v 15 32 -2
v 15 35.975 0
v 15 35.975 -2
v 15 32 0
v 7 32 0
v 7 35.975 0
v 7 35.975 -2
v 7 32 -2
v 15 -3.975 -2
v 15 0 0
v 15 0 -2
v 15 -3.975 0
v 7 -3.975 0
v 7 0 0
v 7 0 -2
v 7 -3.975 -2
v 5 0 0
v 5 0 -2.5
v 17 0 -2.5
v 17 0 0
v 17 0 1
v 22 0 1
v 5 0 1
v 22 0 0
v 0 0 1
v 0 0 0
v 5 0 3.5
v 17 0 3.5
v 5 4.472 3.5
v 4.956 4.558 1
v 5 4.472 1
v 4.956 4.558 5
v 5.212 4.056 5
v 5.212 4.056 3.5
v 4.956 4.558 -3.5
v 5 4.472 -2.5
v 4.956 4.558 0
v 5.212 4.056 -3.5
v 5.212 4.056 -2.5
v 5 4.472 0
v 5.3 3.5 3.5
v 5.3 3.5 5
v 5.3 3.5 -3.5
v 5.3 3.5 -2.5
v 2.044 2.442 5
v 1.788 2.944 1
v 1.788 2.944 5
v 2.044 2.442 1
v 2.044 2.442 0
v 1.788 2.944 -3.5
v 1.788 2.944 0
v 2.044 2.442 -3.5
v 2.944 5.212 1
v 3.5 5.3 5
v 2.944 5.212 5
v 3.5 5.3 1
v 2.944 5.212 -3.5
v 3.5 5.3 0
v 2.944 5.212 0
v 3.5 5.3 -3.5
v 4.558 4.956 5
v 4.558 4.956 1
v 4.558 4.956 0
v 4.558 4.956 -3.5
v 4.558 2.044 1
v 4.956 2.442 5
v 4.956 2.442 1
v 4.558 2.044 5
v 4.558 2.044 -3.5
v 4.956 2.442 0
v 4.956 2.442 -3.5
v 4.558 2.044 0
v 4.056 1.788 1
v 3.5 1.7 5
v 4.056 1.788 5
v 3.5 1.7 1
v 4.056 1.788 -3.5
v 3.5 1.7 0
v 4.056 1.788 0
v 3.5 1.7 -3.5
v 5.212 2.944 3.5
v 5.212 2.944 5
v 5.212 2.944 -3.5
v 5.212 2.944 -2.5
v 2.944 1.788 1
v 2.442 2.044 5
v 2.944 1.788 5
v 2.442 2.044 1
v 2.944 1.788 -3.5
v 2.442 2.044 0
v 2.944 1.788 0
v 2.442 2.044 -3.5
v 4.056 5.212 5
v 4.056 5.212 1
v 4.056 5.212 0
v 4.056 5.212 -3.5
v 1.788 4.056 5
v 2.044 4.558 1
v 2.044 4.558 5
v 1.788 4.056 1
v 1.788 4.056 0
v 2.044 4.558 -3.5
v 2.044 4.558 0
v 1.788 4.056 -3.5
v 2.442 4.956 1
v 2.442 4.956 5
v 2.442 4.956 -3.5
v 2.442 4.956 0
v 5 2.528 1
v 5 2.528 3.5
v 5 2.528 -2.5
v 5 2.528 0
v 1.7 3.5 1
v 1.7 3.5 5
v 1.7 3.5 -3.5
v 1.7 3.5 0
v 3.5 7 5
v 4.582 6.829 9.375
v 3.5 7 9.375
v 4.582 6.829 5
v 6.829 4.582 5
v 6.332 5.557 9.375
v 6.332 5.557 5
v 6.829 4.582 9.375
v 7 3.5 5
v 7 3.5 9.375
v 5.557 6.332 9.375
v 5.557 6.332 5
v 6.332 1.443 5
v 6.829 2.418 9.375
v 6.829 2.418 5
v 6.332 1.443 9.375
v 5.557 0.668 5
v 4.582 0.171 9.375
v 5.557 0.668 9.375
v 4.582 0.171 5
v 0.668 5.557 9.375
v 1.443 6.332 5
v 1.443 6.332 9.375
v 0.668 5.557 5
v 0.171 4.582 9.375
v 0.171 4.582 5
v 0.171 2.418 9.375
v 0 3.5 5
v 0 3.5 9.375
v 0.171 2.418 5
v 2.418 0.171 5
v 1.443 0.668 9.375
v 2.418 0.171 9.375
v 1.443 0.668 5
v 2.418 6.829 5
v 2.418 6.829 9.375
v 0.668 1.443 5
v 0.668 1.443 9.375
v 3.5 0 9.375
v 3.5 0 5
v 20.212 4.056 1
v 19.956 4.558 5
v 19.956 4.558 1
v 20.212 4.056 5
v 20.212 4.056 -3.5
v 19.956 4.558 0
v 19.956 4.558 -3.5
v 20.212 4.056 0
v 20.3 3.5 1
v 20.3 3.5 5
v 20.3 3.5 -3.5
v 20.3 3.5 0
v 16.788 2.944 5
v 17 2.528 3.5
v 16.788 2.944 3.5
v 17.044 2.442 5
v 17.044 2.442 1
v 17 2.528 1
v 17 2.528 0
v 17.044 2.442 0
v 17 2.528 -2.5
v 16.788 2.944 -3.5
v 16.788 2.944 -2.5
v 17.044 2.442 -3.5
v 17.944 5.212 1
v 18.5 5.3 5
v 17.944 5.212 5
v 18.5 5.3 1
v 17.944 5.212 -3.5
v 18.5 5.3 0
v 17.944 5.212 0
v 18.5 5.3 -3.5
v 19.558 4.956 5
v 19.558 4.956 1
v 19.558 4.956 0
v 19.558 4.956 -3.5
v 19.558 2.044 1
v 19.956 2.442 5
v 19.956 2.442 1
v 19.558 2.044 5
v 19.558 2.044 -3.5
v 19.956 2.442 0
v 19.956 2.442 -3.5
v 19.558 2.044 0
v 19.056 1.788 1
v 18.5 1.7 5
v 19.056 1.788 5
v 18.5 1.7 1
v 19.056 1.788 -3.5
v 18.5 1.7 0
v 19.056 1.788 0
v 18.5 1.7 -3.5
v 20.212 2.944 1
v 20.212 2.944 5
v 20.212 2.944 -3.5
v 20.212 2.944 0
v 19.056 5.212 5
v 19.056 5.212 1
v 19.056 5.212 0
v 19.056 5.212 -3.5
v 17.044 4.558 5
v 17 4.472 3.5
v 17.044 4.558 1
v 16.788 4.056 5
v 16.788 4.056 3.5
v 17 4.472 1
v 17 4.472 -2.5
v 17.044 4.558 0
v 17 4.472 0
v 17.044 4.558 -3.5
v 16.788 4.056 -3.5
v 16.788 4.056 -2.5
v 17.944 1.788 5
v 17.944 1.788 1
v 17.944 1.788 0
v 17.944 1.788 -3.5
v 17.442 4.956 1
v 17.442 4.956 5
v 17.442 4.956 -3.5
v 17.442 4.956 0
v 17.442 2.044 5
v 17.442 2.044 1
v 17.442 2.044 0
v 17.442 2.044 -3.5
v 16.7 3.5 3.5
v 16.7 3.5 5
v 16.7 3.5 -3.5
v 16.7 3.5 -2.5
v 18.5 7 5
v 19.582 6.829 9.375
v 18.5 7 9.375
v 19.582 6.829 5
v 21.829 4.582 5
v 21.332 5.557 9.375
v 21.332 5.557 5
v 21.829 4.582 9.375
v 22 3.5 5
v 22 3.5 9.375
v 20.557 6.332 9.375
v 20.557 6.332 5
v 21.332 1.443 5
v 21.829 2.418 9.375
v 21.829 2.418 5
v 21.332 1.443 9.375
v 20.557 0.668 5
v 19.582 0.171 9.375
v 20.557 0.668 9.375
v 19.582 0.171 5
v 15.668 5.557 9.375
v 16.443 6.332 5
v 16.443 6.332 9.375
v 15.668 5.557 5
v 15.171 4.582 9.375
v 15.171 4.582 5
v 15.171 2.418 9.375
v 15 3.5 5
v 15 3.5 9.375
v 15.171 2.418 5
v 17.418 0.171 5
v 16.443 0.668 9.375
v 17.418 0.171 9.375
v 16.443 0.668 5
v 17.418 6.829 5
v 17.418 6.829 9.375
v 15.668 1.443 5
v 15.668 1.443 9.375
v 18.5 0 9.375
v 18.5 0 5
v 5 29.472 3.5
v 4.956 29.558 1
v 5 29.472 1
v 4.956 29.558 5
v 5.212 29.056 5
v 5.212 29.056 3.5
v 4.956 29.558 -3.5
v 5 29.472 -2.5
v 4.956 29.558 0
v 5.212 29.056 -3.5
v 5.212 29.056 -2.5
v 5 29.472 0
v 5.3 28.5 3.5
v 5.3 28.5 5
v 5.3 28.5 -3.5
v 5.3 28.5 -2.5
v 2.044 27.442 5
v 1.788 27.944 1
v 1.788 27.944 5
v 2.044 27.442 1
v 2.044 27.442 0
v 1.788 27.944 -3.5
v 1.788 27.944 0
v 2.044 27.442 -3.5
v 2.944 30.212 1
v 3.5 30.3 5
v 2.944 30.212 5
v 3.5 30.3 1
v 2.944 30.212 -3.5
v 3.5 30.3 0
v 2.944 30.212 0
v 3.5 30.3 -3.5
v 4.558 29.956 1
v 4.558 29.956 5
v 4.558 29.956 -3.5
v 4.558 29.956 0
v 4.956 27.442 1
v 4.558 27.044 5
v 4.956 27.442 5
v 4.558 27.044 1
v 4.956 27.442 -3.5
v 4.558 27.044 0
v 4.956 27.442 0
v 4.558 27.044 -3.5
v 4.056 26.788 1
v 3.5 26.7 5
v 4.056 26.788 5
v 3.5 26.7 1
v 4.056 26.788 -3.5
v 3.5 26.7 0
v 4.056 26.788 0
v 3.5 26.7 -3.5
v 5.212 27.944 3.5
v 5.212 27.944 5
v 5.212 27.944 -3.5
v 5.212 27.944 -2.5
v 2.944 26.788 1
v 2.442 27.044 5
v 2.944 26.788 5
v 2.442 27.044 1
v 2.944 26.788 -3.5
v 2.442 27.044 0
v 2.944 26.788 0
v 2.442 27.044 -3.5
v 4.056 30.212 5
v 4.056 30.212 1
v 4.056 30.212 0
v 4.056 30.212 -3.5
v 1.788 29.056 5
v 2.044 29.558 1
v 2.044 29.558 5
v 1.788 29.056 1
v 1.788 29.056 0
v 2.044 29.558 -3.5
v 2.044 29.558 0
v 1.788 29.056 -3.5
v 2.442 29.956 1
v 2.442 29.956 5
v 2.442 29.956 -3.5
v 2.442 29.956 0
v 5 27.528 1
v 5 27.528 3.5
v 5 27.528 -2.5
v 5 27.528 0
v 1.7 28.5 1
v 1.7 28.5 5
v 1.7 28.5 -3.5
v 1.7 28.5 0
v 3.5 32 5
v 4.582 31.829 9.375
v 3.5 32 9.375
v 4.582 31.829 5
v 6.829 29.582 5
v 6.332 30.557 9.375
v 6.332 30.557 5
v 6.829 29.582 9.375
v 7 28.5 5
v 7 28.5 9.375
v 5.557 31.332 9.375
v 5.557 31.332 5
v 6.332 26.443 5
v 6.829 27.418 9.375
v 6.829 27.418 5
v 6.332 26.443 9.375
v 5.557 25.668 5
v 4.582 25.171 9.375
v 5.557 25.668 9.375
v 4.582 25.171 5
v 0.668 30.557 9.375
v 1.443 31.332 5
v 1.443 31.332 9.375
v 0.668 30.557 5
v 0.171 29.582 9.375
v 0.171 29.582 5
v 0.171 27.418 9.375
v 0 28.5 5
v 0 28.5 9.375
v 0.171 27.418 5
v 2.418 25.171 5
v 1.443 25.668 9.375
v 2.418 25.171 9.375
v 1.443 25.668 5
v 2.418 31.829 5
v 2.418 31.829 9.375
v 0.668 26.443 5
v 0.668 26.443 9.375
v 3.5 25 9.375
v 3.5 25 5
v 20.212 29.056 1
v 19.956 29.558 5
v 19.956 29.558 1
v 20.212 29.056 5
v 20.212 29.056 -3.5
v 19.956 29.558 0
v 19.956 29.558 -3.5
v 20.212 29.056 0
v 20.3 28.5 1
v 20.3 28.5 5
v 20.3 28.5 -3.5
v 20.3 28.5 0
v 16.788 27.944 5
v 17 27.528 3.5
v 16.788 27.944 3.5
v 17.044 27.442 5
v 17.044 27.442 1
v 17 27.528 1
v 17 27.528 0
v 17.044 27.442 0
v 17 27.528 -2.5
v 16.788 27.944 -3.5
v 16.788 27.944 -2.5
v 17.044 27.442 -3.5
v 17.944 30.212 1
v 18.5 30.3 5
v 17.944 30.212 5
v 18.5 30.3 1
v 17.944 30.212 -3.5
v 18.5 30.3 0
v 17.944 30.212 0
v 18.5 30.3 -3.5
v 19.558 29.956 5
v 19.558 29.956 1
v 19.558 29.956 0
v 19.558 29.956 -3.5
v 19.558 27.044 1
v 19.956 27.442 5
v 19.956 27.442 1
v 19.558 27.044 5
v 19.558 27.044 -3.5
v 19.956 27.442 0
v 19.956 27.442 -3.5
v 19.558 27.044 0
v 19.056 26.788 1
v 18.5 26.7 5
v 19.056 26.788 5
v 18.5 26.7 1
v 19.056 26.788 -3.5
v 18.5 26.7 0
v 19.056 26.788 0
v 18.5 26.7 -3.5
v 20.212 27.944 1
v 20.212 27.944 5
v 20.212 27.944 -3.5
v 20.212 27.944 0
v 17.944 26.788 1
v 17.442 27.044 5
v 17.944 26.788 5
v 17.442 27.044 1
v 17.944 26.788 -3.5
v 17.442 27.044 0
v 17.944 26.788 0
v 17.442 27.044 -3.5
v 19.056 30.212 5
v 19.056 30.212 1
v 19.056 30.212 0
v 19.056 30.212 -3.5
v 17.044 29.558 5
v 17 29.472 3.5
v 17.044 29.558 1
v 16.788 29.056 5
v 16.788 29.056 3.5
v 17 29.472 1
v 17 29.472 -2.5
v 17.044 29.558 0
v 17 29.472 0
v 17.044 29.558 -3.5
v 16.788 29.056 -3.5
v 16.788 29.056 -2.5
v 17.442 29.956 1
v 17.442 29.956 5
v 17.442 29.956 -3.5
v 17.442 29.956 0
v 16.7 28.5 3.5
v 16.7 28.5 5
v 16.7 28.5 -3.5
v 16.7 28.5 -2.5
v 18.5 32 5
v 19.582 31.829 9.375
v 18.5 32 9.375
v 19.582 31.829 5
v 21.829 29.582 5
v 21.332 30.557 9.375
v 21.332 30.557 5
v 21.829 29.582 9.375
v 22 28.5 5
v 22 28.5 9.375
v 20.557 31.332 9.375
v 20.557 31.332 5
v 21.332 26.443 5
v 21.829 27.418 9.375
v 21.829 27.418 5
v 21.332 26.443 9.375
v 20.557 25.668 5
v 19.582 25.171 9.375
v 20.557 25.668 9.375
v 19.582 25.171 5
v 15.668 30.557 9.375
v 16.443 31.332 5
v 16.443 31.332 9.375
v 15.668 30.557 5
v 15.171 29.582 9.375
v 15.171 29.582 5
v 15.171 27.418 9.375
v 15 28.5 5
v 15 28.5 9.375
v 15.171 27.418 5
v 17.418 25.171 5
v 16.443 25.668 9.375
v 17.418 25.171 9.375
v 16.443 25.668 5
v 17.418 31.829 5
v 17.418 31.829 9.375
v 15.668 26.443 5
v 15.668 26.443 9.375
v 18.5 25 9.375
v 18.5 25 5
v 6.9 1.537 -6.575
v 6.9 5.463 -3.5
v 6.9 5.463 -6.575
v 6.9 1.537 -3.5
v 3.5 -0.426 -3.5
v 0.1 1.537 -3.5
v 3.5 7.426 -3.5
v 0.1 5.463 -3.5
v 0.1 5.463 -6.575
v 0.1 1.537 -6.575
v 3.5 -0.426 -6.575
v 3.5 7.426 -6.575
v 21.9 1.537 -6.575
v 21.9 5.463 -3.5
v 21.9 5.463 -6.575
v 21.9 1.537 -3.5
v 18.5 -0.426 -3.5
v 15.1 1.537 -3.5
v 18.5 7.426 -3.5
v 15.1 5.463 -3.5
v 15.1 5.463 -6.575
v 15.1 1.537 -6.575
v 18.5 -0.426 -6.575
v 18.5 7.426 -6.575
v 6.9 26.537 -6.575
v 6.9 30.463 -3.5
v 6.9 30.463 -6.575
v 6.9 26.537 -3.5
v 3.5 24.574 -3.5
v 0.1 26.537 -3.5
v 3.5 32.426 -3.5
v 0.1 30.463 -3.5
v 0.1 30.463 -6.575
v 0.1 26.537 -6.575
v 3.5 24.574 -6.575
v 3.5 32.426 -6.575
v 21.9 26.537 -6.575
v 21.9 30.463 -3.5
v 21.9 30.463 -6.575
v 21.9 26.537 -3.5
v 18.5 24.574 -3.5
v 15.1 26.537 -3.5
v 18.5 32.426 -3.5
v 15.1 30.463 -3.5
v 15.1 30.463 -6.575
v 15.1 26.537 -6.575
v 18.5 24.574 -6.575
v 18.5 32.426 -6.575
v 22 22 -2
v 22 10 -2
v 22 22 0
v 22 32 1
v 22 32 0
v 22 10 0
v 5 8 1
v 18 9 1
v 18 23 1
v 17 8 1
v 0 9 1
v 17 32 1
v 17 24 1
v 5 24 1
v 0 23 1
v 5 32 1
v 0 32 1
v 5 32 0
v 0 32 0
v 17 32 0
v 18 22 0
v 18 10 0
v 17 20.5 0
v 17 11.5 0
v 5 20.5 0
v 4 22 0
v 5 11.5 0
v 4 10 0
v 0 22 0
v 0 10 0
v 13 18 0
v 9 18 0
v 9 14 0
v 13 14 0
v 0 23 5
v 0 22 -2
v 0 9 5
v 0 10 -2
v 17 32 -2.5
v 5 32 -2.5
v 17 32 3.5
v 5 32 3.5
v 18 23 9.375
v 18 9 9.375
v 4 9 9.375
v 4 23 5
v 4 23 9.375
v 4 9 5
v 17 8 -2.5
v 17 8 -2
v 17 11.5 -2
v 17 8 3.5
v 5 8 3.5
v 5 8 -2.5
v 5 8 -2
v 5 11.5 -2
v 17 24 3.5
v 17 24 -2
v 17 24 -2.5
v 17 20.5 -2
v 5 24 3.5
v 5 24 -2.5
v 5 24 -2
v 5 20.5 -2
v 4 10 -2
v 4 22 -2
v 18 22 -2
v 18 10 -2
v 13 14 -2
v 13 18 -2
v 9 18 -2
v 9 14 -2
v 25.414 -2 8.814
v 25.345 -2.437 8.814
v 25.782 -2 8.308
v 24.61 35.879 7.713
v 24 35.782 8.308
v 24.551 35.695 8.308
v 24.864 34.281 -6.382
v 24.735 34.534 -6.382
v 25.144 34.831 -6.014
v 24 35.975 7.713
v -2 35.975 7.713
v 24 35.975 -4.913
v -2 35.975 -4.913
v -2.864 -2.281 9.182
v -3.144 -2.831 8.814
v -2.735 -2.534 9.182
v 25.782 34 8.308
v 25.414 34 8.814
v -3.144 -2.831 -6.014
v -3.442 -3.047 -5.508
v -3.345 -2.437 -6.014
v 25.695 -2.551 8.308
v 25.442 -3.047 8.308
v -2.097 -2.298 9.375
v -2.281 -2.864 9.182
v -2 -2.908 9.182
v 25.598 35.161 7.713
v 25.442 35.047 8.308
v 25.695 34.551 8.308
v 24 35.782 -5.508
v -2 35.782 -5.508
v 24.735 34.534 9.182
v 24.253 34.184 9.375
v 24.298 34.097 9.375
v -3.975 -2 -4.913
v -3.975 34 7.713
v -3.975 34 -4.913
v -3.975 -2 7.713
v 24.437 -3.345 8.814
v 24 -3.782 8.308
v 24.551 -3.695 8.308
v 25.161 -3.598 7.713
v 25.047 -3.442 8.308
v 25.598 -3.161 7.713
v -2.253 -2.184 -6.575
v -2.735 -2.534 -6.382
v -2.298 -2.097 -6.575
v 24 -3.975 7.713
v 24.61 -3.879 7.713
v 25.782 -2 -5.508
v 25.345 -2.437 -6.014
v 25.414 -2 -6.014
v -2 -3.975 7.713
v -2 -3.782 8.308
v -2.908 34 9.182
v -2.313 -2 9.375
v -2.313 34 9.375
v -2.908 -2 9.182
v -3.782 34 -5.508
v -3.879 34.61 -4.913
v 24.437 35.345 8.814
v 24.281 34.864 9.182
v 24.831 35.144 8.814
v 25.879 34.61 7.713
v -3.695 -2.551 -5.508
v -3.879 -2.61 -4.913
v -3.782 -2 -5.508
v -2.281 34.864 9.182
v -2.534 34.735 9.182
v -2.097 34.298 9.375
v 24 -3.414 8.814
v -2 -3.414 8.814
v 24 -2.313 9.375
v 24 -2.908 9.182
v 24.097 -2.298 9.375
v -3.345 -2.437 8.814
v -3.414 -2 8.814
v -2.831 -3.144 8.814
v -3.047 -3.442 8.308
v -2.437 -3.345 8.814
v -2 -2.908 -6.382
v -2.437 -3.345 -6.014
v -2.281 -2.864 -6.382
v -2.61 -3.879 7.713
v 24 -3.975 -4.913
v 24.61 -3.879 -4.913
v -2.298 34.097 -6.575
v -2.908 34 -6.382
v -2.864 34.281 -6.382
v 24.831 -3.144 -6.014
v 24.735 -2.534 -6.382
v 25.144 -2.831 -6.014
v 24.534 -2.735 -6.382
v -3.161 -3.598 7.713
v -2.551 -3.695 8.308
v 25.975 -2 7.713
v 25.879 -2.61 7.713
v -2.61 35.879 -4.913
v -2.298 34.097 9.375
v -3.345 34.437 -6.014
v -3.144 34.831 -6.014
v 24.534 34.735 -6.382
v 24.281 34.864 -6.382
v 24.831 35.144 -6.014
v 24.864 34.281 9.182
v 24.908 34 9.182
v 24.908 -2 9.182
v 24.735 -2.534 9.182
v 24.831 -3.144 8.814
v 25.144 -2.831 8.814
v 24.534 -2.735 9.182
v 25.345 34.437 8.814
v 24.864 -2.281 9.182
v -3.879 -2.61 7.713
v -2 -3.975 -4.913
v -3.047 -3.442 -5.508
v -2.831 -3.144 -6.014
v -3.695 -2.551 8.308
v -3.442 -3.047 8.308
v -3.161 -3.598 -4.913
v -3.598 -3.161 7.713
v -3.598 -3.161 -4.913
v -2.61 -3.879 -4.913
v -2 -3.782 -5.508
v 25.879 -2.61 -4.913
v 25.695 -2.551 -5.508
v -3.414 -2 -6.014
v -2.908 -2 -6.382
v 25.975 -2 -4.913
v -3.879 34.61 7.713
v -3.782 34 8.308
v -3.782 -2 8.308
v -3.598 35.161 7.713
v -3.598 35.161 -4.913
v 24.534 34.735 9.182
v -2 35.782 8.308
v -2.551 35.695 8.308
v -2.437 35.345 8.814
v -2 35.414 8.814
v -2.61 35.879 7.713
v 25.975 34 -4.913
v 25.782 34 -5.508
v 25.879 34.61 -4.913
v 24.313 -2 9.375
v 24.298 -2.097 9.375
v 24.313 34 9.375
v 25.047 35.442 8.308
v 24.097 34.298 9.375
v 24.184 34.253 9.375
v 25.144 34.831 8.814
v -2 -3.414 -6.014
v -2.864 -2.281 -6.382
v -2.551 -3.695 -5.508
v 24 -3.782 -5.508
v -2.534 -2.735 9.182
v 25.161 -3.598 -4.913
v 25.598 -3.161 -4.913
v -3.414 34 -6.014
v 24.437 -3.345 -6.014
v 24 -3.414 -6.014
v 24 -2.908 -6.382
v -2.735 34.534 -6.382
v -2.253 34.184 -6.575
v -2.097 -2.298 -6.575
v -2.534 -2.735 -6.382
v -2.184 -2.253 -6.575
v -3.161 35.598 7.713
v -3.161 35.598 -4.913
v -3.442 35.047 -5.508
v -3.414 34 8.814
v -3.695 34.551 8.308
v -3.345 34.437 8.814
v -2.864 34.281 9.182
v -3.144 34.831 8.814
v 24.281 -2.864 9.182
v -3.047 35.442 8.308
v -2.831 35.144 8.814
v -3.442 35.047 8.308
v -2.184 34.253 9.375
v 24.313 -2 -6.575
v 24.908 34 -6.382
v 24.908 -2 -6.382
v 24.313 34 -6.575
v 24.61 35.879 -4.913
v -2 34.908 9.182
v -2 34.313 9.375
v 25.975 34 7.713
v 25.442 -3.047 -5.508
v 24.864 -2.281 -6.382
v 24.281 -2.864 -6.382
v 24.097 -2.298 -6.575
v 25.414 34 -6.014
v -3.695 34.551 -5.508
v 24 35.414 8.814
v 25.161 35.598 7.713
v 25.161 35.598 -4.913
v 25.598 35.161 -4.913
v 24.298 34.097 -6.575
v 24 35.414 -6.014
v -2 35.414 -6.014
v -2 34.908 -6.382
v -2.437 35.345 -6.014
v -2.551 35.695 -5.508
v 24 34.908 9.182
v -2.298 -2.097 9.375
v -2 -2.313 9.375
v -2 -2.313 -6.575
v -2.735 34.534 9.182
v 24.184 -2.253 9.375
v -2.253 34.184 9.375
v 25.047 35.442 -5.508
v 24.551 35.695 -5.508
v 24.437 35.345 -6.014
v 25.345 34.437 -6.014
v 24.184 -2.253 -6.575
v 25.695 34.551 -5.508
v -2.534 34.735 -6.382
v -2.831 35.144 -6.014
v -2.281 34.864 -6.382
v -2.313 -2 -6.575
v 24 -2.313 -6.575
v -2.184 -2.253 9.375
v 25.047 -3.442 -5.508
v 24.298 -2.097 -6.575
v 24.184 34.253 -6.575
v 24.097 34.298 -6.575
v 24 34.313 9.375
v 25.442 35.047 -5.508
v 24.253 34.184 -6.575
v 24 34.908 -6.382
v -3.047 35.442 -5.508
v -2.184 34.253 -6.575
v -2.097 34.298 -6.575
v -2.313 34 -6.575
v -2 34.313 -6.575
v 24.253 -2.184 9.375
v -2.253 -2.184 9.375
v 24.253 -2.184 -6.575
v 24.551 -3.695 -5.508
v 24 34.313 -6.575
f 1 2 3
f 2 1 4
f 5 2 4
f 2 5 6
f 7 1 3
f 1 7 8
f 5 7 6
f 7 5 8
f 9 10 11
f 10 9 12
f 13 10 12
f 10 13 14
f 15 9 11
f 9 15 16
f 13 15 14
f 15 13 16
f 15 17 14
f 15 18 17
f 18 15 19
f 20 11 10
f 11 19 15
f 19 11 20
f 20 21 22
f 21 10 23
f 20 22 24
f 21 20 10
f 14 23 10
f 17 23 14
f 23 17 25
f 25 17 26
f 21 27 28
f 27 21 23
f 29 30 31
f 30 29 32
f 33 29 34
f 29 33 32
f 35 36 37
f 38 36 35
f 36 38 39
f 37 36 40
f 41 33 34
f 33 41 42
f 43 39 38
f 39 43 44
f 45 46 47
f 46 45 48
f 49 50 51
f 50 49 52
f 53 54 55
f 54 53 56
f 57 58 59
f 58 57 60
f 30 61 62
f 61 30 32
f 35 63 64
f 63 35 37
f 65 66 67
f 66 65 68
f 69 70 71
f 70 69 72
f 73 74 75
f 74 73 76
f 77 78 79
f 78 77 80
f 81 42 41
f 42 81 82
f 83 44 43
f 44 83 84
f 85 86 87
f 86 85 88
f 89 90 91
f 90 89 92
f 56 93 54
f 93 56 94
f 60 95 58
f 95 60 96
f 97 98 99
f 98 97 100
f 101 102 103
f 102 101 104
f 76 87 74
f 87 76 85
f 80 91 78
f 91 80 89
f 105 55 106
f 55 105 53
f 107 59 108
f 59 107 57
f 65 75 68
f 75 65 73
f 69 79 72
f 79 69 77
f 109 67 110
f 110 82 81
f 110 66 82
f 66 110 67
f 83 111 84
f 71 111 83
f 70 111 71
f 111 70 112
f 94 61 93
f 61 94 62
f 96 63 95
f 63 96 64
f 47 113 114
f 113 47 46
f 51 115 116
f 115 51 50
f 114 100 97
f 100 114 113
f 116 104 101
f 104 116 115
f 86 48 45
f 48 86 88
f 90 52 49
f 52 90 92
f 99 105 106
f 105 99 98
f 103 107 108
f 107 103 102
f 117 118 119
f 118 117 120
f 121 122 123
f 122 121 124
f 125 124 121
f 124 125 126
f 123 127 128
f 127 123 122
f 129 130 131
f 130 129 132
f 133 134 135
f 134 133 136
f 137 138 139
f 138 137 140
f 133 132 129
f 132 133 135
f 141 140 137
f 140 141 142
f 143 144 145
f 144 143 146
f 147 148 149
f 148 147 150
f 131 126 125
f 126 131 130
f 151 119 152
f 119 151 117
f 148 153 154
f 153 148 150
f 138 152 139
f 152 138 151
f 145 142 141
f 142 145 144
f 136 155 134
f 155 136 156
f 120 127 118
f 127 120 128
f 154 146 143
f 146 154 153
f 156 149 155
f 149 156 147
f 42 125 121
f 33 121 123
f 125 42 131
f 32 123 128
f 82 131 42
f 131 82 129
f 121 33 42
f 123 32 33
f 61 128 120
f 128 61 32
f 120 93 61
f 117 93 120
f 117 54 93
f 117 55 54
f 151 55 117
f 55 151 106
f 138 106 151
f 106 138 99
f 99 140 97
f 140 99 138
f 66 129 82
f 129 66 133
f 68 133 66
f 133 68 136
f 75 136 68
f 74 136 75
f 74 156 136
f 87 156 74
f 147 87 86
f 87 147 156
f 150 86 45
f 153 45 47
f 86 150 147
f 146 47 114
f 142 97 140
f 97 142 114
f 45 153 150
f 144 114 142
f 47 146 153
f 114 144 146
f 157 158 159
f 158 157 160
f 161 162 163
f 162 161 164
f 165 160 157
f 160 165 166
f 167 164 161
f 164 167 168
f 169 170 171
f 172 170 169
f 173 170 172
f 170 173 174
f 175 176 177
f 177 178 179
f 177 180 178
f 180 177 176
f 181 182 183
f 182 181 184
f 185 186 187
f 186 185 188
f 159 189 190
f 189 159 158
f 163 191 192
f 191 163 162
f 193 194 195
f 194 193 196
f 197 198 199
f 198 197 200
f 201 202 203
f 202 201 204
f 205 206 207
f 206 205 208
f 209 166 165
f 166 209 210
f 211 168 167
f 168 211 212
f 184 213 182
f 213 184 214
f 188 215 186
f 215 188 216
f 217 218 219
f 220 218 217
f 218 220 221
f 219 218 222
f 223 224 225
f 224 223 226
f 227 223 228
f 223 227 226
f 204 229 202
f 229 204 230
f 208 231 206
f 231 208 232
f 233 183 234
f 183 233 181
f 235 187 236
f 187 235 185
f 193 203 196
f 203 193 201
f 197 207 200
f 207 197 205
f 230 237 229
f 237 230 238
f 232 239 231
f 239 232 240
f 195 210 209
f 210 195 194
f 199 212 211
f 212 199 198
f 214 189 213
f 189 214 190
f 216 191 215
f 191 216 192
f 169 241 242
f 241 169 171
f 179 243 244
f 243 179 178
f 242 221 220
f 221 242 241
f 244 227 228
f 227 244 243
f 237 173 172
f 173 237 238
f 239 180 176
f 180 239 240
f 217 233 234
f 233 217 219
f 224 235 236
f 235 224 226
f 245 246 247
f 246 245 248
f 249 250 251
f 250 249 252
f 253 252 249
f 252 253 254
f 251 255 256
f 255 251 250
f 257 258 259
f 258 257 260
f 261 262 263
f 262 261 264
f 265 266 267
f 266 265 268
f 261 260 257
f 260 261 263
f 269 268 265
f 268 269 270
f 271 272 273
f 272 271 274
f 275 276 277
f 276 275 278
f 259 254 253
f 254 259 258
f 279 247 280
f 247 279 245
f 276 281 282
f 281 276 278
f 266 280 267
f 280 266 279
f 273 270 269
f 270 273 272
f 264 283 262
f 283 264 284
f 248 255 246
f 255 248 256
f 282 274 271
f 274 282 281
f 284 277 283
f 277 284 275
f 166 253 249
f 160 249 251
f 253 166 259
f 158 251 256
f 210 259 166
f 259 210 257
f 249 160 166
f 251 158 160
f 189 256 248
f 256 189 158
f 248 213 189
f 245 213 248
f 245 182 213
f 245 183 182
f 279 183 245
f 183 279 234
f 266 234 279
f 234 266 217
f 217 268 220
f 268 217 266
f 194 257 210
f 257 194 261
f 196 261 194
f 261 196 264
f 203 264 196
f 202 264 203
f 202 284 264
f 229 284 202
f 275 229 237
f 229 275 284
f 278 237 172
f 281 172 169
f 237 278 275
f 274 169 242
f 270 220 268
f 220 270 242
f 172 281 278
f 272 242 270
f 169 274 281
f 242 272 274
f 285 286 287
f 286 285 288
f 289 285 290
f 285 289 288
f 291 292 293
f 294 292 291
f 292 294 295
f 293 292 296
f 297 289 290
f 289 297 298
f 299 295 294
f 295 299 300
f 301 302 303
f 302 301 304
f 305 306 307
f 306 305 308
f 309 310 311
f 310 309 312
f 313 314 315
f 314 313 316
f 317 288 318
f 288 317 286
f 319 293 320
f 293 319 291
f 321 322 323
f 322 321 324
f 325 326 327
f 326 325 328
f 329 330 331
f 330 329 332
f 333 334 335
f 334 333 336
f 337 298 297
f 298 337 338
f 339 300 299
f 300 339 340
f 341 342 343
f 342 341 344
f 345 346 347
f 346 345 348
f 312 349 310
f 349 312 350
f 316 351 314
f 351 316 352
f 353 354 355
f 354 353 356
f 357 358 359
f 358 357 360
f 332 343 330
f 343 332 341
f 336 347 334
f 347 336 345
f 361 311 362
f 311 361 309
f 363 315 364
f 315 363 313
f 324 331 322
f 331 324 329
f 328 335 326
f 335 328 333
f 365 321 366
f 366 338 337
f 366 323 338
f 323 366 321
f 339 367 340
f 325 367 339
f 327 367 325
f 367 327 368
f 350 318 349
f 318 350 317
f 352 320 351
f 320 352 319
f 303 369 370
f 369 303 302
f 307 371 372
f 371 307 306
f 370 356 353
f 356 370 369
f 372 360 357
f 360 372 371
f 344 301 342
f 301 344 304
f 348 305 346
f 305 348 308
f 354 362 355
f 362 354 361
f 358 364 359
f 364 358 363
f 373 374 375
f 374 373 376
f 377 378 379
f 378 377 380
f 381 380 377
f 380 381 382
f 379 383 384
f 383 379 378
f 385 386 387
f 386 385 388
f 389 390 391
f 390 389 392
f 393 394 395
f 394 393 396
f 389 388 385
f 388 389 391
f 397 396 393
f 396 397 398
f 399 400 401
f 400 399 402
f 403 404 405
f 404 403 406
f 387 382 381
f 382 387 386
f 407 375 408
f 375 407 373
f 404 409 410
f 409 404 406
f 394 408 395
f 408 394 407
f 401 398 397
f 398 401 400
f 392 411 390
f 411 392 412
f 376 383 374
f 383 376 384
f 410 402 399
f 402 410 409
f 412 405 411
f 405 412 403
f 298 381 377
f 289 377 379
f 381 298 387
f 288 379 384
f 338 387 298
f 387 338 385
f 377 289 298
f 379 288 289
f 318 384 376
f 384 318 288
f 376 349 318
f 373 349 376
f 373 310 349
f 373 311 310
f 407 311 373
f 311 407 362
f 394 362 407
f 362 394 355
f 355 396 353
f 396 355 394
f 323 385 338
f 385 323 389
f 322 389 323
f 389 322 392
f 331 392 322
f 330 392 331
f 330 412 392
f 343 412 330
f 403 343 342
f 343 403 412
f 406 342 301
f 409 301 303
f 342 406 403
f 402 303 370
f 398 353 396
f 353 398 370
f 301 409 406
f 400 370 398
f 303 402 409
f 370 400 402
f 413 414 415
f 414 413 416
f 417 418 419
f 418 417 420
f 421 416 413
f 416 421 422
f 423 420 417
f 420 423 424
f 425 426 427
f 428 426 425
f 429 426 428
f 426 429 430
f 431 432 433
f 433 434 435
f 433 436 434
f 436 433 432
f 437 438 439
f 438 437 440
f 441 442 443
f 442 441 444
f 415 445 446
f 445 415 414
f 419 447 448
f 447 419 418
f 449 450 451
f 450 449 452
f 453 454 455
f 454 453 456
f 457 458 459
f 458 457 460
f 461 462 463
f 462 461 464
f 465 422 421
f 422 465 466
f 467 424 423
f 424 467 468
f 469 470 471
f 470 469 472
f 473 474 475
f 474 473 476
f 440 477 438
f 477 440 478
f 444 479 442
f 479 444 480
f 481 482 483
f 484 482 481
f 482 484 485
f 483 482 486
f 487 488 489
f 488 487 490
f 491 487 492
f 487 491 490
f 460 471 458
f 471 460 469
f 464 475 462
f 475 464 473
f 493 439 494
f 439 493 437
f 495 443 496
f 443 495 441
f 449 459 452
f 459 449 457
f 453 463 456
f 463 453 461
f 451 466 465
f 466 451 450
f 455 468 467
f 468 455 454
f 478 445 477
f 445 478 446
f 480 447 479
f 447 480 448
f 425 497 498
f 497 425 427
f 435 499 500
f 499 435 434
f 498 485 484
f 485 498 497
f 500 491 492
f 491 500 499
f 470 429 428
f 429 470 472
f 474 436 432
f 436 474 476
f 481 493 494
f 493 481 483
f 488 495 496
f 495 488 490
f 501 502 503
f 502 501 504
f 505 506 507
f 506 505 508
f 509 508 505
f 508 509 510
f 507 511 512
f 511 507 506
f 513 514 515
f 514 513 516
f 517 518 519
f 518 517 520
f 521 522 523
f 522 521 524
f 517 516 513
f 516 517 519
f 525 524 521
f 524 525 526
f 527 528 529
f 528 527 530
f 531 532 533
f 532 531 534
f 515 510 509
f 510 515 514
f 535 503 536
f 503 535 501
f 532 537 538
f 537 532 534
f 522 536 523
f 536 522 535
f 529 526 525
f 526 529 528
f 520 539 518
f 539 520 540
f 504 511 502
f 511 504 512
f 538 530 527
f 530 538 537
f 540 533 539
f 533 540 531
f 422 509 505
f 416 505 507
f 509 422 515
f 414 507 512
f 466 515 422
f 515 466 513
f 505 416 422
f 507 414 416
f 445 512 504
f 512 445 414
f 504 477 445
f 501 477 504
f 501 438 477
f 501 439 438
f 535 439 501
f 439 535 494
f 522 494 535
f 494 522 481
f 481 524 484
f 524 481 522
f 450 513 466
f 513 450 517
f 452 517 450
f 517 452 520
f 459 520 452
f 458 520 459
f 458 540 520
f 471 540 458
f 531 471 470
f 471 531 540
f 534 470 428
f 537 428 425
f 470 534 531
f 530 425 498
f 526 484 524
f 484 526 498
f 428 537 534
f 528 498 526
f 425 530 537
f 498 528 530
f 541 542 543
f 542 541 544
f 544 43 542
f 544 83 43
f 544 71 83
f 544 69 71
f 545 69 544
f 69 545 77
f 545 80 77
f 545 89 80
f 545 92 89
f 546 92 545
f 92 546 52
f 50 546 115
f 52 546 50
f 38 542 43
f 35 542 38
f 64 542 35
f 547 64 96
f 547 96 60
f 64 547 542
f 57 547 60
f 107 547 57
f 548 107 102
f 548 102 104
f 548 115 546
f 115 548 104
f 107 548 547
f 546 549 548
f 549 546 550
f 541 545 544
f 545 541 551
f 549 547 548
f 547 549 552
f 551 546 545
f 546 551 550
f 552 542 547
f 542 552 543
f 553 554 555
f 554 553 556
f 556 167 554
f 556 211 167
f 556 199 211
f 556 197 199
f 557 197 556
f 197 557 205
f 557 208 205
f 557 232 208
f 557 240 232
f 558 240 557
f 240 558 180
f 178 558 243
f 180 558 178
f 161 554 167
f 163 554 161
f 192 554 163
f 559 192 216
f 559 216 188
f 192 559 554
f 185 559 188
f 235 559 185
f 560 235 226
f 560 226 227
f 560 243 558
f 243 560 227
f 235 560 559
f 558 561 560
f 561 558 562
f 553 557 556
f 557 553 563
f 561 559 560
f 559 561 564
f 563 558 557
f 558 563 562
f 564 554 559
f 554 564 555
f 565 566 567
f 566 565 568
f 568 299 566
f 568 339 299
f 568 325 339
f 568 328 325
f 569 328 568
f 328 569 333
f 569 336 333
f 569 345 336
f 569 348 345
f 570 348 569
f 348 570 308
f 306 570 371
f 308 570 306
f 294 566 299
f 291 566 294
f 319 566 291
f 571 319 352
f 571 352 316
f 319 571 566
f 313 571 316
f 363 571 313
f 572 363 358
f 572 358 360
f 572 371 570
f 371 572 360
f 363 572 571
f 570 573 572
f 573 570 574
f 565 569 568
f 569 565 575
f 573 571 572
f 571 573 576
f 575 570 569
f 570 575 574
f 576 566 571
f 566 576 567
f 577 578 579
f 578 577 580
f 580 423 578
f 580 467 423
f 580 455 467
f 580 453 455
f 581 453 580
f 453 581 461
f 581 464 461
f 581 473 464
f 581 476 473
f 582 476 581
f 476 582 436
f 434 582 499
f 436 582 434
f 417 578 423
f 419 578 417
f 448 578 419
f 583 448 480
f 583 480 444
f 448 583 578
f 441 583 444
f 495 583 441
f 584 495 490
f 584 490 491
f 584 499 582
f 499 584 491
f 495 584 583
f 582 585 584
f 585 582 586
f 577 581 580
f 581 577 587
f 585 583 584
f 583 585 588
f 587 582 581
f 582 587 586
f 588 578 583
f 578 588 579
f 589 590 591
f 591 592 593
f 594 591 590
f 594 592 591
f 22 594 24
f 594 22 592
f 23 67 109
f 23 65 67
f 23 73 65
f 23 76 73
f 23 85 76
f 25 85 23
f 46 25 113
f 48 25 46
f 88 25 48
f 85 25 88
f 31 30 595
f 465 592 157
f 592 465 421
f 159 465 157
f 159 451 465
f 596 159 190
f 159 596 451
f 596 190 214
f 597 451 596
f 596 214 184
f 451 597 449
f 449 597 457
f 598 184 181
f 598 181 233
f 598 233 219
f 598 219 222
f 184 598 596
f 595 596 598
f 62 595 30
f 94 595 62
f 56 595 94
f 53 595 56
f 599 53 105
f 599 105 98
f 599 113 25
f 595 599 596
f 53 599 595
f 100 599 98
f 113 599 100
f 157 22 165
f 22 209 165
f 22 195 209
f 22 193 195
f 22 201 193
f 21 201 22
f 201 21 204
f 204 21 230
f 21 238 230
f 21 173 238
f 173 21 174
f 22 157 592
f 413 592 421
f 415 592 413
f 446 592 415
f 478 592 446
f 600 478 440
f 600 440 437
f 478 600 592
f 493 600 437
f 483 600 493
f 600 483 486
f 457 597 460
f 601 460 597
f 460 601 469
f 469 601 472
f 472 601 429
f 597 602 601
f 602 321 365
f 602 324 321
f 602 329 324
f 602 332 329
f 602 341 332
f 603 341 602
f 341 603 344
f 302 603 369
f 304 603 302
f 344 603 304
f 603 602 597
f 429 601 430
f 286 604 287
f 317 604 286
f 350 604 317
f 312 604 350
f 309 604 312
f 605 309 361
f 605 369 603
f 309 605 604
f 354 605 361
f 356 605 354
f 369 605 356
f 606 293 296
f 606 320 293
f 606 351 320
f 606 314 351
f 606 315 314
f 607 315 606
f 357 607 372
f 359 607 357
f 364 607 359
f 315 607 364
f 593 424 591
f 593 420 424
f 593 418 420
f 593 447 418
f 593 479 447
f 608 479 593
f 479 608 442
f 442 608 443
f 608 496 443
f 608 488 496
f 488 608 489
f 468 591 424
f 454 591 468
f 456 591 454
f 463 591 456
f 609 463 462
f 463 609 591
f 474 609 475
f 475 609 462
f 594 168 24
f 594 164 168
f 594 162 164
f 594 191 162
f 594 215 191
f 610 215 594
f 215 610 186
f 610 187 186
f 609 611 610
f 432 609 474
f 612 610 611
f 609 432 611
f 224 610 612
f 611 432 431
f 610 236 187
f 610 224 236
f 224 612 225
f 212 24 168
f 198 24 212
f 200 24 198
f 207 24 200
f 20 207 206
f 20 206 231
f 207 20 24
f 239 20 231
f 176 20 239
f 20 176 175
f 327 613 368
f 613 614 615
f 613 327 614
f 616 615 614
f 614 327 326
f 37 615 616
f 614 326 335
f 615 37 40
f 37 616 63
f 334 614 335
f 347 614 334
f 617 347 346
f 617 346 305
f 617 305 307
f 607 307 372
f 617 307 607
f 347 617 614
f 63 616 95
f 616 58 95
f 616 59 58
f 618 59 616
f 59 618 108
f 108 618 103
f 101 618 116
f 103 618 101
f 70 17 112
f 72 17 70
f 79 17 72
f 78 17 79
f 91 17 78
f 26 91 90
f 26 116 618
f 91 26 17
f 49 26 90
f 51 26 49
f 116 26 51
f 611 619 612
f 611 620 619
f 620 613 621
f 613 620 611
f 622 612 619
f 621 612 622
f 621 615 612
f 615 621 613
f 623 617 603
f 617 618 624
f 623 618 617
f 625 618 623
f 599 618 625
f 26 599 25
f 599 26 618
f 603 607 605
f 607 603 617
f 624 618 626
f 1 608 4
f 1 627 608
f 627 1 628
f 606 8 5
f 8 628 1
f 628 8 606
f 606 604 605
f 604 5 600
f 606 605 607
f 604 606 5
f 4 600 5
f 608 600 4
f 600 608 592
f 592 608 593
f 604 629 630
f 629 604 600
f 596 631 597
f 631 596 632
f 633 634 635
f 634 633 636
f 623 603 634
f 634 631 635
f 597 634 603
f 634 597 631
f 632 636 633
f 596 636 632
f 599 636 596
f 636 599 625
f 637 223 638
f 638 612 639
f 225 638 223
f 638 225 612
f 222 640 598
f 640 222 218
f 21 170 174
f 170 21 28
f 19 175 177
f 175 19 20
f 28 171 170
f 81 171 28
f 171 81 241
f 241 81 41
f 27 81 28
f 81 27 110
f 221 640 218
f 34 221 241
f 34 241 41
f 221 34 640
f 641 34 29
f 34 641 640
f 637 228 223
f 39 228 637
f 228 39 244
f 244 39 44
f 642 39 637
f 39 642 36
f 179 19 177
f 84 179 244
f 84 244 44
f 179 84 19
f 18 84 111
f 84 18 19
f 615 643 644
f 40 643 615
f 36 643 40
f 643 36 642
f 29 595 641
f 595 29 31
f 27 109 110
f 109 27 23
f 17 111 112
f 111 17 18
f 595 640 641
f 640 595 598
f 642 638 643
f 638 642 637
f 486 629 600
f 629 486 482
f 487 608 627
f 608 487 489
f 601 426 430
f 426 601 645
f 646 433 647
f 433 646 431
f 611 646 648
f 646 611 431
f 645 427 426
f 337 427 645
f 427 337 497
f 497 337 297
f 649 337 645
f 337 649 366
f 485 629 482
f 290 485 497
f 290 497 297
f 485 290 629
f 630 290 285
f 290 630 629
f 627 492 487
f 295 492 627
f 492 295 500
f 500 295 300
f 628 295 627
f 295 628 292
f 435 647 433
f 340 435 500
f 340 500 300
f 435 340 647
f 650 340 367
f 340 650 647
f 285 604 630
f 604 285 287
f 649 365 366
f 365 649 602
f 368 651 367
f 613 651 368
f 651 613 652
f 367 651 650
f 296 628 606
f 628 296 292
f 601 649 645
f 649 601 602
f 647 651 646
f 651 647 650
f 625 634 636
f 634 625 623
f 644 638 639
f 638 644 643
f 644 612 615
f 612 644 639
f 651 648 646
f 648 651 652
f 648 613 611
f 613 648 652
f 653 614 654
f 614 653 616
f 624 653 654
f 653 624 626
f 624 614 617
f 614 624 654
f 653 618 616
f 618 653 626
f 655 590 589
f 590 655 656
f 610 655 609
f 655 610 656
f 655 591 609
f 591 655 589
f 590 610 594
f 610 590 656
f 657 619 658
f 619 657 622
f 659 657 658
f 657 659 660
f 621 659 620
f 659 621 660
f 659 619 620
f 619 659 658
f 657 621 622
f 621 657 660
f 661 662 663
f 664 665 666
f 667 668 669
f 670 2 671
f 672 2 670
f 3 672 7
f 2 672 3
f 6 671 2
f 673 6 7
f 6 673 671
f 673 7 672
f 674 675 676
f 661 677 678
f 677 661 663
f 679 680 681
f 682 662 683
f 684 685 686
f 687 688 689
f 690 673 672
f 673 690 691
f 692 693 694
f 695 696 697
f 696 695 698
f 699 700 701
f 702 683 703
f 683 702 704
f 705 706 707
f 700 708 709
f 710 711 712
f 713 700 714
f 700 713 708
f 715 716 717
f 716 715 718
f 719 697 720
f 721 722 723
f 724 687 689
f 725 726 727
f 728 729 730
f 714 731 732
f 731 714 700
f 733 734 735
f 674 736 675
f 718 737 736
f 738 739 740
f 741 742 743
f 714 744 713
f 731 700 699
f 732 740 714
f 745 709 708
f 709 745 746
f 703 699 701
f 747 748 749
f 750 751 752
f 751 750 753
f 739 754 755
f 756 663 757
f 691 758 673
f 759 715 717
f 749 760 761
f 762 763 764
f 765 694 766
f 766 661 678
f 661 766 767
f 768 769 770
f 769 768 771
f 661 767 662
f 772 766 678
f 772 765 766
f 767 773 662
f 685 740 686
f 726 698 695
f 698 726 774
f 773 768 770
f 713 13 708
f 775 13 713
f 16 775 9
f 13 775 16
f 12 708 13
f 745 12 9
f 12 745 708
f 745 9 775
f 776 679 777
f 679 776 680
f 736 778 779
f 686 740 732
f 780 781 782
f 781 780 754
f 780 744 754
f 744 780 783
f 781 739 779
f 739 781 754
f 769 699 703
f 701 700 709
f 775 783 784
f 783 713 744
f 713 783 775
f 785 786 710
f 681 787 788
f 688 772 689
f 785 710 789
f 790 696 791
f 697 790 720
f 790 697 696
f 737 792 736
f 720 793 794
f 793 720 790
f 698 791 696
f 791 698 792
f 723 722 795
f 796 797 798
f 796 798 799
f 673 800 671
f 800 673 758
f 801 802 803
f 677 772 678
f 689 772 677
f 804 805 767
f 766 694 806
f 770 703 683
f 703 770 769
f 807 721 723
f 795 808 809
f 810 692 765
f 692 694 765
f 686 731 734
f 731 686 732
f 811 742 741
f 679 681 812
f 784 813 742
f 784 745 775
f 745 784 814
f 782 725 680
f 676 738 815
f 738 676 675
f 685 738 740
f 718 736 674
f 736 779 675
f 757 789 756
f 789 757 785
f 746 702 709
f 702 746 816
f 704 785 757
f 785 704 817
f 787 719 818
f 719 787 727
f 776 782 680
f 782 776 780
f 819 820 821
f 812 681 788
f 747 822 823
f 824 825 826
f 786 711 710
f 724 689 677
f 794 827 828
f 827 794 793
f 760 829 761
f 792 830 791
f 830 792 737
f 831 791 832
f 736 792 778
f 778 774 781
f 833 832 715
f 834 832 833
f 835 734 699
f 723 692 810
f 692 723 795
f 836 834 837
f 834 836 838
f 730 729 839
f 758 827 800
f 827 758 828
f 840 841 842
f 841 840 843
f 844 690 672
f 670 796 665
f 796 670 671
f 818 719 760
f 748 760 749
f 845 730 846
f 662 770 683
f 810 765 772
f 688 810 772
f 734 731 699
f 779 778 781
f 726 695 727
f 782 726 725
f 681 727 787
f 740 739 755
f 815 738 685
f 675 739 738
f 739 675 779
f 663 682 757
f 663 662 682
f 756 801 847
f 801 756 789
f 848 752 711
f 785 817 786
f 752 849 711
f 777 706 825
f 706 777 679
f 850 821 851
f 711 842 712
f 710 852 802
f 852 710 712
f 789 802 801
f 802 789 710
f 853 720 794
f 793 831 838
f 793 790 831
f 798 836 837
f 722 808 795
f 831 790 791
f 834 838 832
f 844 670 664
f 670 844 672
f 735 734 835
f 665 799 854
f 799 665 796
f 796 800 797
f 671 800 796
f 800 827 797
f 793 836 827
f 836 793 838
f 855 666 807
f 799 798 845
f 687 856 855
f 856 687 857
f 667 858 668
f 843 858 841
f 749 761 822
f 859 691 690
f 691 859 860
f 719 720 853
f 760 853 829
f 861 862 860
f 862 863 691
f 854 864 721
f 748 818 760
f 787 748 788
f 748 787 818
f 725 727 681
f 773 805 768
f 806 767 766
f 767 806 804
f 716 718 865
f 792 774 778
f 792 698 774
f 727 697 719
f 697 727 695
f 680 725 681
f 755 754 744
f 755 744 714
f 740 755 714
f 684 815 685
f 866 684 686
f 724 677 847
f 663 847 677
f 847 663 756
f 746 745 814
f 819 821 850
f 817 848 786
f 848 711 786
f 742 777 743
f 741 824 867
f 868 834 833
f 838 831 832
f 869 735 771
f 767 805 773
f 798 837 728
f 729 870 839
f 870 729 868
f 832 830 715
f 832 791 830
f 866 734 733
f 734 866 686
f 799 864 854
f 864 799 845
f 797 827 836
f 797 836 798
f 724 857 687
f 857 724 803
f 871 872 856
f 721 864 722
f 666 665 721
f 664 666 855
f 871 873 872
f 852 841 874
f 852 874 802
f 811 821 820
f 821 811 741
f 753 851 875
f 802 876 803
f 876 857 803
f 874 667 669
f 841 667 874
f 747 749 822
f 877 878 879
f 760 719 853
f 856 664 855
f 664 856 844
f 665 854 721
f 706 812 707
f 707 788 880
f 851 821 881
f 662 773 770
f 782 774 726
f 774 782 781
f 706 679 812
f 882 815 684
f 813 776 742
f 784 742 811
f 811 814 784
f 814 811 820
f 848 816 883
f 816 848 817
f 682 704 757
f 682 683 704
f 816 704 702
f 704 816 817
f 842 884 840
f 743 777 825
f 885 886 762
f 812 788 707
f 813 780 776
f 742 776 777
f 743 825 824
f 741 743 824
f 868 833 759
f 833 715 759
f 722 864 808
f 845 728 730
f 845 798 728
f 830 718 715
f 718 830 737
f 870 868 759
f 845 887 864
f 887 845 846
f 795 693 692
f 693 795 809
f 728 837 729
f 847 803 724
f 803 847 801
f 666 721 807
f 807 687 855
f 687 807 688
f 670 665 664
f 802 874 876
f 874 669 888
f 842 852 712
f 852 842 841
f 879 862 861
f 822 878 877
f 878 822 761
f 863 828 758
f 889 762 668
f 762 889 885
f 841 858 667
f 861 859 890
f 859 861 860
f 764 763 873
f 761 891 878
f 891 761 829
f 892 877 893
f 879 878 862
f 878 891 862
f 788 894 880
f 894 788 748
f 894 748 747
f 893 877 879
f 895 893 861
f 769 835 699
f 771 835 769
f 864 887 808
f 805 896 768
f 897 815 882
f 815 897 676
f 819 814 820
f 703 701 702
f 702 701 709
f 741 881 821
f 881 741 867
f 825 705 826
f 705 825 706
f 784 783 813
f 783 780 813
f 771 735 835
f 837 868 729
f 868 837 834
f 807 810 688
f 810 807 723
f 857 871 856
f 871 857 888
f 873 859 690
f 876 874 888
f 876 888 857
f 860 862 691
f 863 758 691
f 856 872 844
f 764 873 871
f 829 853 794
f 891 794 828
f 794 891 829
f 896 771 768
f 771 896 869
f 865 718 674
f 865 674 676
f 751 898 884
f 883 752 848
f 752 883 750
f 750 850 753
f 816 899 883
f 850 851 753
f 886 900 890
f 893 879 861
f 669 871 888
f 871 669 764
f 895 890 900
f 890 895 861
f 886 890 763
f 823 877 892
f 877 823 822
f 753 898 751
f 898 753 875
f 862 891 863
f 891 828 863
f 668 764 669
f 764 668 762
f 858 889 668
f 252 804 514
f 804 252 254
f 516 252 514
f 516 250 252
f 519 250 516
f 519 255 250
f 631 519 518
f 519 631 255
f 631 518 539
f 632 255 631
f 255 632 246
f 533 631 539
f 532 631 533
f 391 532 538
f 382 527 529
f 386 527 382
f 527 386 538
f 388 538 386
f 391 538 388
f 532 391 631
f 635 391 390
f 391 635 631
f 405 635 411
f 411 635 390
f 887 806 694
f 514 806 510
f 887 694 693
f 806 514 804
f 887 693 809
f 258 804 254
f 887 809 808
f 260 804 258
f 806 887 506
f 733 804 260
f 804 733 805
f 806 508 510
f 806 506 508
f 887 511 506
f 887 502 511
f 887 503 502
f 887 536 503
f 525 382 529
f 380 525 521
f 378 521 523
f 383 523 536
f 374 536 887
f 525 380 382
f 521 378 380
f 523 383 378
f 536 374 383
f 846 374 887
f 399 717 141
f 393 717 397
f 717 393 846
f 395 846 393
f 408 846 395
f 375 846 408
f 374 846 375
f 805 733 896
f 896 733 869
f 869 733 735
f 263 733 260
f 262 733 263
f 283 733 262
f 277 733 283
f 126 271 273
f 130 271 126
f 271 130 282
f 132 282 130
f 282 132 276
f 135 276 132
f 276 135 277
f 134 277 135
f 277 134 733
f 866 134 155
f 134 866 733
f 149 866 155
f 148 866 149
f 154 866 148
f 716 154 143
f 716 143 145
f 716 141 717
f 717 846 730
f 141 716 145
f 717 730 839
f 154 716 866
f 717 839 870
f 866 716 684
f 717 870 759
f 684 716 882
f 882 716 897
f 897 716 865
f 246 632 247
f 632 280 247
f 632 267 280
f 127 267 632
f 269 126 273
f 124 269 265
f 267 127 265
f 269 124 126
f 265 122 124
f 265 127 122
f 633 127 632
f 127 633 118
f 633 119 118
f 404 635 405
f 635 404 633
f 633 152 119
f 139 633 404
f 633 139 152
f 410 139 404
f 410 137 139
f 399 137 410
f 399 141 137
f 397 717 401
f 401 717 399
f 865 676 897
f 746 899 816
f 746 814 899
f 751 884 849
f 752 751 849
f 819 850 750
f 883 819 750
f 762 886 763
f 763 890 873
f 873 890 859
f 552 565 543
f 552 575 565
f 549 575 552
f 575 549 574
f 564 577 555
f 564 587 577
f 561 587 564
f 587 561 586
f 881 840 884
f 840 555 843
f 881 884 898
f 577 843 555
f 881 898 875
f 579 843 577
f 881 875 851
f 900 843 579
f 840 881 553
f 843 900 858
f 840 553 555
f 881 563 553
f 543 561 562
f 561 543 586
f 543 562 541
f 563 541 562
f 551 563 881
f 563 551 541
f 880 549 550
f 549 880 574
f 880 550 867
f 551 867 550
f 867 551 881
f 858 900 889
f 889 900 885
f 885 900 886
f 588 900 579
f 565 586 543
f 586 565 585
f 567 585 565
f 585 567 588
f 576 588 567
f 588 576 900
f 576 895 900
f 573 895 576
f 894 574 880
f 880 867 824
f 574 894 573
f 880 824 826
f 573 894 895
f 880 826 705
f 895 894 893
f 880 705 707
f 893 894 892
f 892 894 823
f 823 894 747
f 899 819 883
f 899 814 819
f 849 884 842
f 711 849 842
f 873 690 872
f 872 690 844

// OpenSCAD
module pcb()
{

union()
{
 difference()
 {
  union()
  {
   //pcb
   color("green") cube([22,32,1]);
   //button
   color("blue") translate([4,9,0]) cube(14);
  
   //cables
   color("red") translate([5,0,-2.5]) cube([12,8,6]);
   color("red") translate([5,24,-2.5]) cube([12,8,6]);

   // resistor
   color("yellow") translate([0,9,1]) cube([5,14,4]);


   // open below for solderspots
   color("red") translate([5,3.5,-2]) cube([12,8,2]);
   color("red") translate([5,20.5,-2]) cube([12,8,2]);

    color("red") translate([0,10,-2]) cube([4,12,2]);
    color("red") translate([18,10,-2]) cube([4,12,2]);

   color("red") translate([9,14,-2]) cube([4,4,2]);




   // open below for solderspots
  // color("red") translate([0,4,-2]) cube([22,24,2]);


   }
 
  //mounting holes
  translate([3.5,3.5,-1]) cylinder(r=1.6,h=10,$fn=20);
  translate([18.5,3.5,-1]) cylinder(r=1.6,h=10,$fn=20);
  translate([3.5,28.5,-1]) cylinder(r=1.6,h=10,$fn=20);
  translate([18.5,28.5,-1]) cylinder(r=1.6,h=10,$fn=20);
  }
 }
}

module cables()
{




  //cables out
  color("green") translate([7,31,-2]) cube([8,50,2]);
  color("green") translate([7,-50,-2]) cube([8,50,2]);





}




module screws()
{


 translate([3.5,3.5,-25]) cylinder(r=1.8,h=50,$fn=20);
 translate([3.5,3.5,5]) cylinder(r=3.5,h=20,$fn=20);


 translate([18.5,3.5,-25]) cylinder(r=1.8,h=50,$fn=20);
 translate([18.5,3.5,5]) cylinder(r=3.5,h=20,$fn=20);



 translate([3.5,28.5,-25]) cylinder(r=1.8,h=50,$fn=20);
 translate([3.5,28.5,5]) cylinder(r=3.5,h=20,$fn=20);




 translate([18.5,28.5,-25]) cylinder(r=1.8,h=50,$fn=20);
 translate([18.5,28.5,5]) cylinder(r=3.5,h=20,$fn=20);






}



module muttern(height=2)
{
 intersection()
 {
  cube([6.8,10,height], center=true);
  rotate([0,0,120]) cube([6.8,10,height], center=true);
  rotate([0,0,240]) cube([6.8,10,height], center=true);
 }

}



module hull()
{
$fn=10;
minkowski() {
  cube([26,36,12]);
   //rounded corners
  sphere(2, $fn=20);
}

}



module ueberstand()
{

intersection()
{
difference()
{



minkowski() {
  cube([26,36,10]);
   //rounded corners
  sphere(2, $fn=20);
}




translate([1,1,0]) minkowski() {
  cube([23,33,20]);
   //rounded corners
  sphere(2, $fn=20);
}




}

translate([-3,-3,3]) cube([100,100,2]);
}

}




module box()
{
difference()
{
 translate([-2,-2,-4.6]) hull();

 cables();
 screws();

 translate([3.5,3.5,-6]) muttern(5);
 translate([18.5,3.5,-6]) muttern(5);
 translate([3.5,28.5,-6]) muttern(5);
 translate([18.5,28.5,-6]) muttern(5);

 pcb();





}


}









//rotate([0,180,0])
 difference()
{



 box(center=true);


// ueberstand
//translate([-2,-2,-5]) color("blue") ueberstand(); 




//translate([0,0,50]) cube([100,100,100],center=true);


}







//rotate([0,180,0]) 
//difference()
//{


// ueberstand
//translate([-2,-2,-5]) color("blue") ueberstand(); 

// cables();

//}



// pcb();
